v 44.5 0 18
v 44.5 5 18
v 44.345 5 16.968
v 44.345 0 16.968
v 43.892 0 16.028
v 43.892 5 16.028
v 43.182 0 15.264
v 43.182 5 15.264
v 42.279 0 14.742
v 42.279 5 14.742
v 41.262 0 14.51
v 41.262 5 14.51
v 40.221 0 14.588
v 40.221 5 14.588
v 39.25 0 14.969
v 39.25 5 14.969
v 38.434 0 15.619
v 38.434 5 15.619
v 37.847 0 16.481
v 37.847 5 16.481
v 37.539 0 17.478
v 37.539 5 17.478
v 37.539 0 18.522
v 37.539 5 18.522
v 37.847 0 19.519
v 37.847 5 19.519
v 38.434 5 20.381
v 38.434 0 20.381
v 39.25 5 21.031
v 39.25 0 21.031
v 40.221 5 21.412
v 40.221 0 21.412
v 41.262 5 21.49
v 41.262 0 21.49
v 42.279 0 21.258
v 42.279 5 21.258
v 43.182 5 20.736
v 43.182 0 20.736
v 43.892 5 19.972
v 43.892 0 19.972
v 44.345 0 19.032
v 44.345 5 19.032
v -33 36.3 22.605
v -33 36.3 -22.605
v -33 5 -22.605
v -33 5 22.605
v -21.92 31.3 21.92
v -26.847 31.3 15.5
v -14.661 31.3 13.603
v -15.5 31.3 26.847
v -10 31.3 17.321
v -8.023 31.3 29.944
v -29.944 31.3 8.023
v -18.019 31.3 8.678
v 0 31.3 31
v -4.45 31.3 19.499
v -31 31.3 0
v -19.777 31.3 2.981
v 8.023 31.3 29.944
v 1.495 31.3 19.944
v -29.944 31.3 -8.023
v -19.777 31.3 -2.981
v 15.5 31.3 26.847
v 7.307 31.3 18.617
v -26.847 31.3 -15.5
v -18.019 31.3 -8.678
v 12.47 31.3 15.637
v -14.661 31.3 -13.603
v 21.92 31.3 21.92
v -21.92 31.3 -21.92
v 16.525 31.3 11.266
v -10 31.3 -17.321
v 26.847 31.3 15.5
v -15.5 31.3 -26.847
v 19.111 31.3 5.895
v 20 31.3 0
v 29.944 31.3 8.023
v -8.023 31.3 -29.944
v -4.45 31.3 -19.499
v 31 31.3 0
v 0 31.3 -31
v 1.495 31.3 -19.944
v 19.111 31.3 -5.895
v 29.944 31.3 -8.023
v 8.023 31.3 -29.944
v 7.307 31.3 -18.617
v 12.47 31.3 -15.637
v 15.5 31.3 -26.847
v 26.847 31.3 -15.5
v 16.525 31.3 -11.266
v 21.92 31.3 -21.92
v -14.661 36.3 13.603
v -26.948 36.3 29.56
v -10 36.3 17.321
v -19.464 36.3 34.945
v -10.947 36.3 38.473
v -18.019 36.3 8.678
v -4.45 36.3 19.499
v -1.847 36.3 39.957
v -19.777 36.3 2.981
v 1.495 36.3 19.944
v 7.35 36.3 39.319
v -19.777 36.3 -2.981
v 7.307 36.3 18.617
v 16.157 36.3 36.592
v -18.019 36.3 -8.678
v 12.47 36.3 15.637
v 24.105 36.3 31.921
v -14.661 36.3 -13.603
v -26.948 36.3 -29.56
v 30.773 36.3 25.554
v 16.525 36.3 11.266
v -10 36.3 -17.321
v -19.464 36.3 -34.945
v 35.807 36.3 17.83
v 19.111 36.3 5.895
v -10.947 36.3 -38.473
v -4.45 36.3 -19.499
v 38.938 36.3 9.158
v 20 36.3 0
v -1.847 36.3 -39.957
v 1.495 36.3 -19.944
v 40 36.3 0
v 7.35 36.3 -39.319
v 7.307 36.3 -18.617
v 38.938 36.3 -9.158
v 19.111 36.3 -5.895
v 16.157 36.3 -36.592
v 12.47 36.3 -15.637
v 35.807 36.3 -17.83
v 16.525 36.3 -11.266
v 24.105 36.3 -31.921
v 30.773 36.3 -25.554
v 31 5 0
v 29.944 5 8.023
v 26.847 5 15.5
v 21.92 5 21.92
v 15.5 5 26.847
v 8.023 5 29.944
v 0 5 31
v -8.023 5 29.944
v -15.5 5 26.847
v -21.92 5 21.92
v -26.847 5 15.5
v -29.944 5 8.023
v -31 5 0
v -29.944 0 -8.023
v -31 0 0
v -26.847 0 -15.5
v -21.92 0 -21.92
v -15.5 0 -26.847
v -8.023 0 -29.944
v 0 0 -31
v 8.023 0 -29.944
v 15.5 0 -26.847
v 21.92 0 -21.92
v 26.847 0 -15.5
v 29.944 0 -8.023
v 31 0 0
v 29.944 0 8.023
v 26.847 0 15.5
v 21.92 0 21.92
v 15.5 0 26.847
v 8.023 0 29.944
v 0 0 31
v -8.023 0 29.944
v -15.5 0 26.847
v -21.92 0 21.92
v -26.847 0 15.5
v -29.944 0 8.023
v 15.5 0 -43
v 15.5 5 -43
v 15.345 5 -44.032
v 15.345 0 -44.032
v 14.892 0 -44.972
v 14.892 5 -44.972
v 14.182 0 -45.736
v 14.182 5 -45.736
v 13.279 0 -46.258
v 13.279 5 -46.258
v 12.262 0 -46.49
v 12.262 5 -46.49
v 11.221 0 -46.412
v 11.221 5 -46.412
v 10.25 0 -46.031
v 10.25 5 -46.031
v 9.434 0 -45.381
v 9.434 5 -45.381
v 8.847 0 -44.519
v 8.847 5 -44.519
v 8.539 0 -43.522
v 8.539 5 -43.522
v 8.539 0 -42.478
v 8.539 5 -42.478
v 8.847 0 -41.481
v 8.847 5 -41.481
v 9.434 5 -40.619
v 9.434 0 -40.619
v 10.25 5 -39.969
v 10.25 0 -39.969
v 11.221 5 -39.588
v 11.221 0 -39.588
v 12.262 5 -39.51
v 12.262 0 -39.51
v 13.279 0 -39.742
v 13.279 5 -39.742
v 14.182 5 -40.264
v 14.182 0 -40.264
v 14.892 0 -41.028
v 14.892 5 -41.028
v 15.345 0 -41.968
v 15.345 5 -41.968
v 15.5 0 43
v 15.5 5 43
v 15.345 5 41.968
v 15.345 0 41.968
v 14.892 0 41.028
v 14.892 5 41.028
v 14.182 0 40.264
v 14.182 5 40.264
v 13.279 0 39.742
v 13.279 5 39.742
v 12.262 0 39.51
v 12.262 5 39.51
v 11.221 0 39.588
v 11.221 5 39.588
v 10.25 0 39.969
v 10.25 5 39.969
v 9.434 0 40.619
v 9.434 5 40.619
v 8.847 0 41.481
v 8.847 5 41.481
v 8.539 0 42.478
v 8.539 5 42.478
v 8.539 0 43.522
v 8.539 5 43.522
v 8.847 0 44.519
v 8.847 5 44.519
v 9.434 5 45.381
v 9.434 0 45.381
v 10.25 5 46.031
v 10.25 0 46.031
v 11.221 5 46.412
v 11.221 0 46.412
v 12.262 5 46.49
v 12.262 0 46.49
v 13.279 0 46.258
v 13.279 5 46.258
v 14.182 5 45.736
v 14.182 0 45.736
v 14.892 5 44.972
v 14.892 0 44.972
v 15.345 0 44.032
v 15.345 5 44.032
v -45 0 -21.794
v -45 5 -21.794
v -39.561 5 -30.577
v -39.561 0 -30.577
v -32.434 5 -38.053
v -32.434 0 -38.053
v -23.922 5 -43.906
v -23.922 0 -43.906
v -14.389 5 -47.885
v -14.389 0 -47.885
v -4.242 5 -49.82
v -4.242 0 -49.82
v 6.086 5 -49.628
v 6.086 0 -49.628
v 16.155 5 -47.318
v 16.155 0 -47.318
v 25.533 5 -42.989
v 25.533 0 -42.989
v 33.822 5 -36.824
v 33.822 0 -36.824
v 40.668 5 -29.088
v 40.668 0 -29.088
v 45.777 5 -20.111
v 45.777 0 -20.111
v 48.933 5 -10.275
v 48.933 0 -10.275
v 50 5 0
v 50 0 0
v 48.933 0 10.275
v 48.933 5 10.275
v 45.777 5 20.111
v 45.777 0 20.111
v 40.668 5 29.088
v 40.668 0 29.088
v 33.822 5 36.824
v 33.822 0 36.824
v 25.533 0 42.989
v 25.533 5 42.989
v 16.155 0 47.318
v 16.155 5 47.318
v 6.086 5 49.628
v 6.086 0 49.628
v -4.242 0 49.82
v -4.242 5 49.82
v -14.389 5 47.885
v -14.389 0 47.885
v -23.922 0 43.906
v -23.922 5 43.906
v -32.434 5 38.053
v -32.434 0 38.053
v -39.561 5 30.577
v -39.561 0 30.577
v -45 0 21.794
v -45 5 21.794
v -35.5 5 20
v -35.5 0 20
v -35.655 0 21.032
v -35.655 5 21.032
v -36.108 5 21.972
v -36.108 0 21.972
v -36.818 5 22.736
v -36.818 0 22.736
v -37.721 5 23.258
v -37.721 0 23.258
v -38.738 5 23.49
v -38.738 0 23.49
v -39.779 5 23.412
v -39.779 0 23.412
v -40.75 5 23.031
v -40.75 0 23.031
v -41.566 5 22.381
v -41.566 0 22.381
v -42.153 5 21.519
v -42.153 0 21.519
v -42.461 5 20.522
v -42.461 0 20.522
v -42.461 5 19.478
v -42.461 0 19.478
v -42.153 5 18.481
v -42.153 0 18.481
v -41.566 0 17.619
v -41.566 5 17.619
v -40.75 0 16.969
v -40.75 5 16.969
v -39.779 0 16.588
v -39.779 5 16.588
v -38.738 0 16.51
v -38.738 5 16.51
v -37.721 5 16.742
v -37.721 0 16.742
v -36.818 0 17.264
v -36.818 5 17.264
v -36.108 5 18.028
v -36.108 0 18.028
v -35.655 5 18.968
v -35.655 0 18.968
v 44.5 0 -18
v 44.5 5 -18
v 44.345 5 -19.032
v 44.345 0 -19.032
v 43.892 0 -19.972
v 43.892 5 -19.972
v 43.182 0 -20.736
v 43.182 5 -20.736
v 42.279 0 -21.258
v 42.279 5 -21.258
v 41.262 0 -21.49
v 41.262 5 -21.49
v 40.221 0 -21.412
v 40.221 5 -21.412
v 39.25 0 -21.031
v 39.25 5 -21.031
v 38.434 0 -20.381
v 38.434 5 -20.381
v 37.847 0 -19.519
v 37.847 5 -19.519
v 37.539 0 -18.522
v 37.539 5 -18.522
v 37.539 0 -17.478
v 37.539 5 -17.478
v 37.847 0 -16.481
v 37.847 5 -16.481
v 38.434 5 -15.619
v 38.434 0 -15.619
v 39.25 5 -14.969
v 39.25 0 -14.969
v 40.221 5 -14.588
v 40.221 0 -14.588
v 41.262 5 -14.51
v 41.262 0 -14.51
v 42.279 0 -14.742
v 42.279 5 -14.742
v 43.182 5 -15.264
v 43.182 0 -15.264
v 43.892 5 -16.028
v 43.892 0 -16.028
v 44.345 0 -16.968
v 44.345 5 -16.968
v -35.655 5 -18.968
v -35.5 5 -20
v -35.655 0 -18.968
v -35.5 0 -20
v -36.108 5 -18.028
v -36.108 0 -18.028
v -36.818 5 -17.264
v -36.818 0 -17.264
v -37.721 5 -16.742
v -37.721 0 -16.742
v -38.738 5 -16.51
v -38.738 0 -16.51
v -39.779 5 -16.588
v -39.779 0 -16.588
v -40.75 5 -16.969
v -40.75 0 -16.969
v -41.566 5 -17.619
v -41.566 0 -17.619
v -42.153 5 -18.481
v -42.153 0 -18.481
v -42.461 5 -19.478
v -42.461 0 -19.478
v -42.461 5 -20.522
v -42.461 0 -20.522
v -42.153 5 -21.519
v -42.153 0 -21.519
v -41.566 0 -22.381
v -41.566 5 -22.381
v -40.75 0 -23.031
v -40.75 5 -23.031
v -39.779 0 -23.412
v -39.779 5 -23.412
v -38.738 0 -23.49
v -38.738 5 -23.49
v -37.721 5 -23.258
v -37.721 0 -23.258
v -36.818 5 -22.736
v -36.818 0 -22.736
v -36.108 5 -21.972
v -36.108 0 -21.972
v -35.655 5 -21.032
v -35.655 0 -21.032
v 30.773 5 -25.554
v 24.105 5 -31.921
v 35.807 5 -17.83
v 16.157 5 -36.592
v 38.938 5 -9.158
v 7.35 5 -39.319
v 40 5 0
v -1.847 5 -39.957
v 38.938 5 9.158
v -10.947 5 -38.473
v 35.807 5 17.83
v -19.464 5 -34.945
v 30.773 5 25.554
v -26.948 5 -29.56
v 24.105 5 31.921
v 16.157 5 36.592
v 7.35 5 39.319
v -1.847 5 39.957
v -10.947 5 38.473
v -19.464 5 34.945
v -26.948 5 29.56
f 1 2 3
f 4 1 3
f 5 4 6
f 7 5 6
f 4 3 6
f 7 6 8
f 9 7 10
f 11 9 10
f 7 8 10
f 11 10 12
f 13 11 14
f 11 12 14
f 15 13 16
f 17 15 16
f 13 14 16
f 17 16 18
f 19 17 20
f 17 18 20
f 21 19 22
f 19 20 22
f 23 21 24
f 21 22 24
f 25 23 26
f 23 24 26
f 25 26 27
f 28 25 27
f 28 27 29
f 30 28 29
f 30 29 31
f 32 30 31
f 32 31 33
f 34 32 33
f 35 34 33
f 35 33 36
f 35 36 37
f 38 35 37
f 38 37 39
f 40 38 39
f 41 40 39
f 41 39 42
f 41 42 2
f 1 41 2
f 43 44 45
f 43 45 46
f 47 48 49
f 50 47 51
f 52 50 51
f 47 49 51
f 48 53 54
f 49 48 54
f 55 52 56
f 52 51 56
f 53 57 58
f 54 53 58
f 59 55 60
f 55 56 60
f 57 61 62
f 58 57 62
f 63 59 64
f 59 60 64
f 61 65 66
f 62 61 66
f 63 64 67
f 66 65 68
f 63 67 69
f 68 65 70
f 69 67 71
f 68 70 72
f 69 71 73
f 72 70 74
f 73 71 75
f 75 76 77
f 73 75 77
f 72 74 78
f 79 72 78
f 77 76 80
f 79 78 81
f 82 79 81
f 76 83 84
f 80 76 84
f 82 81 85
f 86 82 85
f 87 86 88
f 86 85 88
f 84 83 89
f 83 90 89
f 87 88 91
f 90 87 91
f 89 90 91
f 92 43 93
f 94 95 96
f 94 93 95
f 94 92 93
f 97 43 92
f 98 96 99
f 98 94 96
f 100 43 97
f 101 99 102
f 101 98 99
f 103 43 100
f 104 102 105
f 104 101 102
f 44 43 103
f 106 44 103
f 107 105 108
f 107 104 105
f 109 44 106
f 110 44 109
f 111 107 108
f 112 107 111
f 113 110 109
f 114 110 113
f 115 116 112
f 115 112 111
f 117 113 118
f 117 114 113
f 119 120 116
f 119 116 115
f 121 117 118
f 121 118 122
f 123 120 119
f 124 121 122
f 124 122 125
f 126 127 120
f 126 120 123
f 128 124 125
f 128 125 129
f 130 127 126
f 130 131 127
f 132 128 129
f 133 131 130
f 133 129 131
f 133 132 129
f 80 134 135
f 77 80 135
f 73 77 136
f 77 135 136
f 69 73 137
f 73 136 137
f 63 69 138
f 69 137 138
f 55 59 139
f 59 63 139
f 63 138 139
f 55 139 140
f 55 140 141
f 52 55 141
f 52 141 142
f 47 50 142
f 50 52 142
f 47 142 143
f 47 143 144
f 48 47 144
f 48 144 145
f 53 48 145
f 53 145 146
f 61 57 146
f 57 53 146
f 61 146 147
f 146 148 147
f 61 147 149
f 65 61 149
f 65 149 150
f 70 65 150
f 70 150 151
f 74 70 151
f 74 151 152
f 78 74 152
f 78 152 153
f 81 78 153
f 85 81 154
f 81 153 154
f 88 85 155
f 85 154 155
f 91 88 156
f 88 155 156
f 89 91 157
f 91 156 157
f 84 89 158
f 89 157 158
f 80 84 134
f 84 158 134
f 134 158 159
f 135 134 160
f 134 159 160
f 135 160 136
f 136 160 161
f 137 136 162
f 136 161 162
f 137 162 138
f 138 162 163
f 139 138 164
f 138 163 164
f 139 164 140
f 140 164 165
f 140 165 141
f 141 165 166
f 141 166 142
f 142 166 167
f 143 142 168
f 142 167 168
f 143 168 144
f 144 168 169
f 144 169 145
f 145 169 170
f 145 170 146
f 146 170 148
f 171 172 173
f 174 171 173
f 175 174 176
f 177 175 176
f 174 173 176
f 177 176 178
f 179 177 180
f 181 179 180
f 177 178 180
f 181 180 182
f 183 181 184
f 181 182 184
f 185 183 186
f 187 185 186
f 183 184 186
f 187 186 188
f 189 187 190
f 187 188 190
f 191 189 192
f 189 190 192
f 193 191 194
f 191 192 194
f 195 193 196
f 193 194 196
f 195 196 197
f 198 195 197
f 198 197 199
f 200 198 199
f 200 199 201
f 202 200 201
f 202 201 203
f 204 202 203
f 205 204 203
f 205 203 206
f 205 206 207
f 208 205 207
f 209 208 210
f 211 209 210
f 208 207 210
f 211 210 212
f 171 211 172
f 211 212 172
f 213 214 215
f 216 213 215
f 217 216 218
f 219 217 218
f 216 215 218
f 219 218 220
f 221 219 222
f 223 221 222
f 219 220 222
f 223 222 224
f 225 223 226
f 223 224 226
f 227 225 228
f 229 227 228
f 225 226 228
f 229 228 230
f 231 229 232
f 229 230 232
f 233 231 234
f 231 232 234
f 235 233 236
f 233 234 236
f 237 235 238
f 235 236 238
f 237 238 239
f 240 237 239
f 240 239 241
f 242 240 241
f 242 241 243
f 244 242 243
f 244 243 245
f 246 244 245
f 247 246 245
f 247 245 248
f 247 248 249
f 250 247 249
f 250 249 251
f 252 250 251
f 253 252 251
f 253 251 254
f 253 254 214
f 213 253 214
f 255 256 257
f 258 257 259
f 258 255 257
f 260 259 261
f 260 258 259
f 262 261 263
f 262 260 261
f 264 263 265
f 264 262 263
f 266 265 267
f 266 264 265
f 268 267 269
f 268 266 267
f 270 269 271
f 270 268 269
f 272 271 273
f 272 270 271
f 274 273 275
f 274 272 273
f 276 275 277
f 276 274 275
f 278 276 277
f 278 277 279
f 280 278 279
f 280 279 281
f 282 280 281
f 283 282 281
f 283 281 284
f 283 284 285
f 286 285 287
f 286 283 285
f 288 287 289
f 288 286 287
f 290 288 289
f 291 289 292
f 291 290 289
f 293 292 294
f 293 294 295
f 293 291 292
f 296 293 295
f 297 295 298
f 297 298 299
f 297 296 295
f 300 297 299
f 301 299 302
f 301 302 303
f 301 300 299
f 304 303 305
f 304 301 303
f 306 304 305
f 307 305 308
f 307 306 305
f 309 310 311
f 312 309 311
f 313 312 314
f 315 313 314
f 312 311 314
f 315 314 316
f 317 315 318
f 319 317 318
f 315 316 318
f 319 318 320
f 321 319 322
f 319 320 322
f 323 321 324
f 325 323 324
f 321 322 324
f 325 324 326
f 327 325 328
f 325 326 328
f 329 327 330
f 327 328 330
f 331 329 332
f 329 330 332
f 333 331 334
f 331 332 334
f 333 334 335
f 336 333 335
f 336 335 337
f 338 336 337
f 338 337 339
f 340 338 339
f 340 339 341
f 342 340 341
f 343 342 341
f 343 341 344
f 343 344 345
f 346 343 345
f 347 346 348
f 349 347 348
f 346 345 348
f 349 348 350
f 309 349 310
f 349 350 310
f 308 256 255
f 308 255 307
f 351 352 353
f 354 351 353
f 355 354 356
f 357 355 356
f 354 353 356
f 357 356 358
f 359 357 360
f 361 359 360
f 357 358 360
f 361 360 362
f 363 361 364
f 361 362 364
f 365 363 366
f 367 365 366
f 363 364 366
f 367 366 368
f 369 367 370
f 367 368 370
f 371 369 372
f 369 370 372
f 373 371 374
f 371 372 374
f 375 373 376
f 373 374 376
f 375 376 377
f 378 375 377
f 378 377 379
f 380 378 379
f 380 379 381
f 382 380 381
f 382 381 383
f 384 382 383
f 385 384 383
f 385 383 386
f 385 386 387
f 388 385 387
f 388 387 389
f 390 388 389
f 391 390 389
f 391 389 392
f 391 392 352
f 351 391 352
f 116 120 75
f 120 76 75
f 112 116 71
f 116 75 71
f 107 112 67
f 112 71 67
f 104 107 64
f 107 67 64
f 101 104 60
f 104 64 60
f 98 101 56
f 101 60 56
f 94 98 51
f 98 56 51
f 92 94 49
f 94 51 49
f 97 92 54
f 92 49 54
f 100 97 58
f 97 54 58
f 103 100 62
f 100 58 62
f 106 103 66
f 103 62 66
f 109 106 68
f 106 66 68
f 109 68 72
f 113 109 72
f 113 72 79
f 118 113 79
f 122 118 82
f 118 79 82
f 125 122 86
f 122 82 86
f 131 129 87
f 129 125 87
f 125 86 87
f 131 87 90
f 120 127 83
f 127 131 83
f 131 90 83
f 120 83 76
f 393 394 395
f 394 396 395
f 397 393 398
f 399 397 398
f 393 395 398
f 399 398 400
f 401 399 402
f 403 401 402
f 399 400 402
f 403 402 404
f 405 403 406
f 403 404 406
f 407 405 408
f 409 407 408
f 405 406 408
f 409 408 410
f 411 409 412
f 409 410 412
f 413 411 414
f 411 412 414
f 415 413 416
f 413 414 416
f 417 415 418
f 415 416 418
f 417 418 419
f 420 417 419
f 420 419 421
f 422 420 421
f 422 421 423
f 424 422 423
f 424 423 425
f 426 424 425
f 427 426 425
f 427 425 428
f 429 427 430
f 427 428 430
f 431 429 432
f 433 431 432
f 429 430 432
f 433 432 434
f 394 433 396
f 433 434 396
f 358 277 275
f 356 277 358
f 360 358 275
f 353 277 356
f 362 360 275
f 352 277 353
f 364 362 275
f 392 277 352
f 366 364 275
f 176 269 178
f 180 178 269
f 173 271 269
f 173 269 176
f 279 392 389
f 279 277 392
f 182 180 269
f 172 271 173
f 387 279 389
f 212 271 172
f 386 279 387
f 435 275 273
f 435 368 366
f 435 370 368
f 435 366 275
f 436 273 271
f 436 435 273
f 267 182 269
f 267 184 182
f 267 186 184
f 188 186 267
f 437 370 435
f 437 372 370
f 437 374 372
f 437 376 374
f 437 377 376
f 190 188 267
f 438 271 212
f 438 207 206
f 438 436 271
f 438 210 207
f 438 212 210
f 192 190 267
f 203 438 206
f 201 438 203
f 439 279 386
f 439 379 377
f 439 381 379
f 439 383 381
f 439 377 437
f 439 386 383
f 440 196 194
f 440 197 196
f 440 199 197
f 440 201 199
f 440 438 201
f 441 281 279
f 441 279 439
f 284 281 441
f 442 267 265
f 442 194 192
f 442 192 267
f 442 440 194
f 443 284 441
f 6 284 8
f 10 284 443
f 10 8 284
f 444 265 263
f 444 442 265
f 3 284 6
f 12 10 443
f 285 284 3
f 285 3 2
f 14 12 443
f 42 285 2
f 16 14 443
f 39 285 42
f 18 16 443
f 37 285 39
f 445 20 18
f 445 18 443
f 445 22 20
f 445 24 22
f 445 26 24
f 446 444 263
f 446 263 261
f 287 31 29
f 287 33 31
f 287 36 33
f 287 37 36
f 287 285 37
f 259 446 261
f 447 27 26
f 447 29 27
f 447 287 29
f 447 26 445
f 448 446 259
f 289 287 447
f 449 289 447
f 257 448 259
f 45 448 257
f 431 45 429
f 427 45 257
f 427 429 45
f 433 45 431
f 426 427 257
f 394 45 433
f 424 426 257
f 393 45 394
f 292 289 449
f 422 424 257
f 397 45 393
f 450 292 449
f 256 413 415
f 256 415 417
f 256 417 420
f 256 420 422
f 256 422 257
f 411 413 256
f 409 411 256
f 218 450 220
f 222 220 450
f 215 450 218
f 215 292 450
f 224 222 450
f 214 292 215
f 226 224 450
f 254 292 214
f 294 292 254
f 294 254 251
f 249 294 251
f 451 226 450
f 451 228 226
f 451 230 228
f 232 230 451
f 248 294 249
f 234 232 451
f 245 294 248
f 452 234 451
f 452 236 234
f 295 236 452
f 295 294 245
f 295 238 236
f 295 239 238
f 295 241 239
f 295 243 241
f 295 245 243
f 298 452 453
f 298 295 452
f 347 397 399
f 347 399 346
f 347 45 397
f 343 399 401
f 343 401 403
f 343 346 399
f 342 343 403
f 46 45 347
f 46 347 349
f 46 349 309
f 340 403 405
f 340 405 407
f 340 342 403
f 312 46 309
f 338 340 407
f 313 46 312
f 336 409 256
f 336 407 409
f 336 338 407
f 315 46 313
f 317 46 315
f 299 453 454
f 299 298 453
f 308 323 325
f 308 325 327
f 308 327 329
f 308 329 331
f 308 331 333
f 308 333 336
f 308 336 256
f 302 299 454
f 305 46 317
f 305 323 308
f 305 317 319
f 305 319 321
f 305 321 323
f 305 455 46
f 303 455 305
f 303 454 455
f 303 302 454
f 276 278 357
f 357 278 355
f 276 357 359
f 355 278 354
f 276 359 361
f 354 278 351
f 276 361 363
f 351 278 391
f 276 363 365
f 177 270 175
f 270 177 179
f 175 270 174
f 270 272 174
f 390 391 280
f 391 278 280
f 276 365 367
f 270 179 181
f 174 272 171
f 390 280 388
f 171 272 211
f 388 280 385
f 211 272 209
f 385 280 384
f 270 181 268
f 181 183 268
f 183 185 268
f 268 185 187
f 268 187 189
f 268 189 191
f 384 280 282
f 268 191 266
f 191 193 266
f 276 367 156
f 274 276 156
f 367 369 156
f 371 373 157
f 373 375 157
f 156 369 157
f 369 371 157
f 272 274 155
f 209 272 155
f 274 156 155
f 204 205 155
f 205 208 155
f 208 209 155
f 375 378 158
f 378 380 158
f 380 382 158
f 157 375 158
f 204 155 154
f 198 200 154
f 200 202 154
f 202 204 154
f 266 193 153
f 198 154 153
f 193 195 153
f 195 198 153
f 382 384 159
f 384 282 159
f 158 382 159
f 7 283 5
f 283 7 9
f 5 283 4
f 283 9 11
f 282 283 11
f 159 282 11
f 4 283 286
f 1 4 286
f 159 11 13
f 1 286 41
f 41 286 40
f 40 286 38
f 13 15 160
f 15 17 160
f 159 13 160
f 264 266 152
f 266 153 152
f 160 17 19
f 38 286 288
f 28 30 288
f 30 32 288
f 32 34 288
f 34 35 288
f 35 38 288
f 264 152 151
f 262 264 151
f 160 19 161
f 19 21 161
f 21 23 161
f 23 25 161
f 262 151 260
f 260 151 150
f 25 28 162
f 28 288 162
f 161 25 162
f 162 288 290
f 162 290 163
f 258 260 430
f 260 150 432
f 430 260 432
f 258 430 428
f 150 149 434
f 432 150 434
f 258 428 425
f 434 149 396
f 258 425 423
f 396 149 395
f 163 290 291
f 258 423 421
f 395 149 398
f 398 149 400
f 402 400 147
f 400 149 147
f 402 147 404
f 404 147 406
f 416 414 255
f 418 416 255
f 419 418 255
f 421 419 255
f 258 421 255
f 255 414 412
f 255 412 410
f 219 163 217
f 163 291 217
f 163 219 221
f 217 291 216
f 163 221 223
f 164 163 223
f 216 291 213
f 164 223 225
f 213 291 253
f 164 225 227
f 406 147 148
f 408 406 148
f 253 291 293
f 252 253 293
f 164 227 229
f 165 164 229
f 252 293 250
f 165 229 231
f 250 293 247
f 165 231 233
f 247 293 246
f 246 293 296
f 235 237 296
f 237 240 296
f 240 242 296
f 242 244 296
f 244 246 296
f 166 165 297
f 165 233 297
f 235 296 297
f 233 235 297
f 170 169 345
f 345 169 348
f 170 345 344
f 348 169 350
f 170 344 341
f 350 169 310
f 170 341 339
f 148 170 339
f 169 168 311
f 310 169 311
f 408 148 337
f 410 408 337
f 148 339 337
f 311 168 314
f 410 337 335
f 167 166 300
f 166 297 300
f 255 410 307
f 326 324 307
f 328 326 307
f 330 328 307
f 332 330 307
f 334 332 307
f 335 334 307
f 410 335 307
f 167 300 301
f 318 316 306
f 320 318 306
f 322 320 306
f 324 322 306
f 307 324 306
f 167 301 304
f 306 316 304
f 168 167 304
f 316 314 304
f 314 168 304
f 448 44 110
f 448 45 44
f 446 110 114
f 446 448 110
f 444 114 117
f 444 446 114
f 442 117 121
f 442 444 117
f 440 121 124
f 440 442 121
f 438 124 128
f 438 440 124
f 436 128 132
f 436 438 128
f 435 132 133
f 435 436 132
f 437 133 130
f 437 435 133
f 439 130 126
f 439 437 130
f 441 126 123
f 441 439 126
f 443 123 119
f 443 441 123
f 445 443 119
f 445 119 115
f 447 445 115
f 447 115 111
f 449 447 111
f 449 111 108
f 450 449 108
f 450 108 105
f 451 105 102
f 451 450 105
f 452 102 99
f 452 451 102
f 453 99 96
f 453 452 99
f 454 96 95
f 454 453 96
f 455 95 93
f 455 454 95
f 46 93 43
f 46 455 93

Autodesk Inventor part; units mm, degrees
ref_plane "YZ Plane" through (0, 0, 0) normal (1, 0, 0) x (0, 1, 0)
ref_plane "XZ Plane" through (0, 0, 0) normal (0, 1, 0) x (-1, 0, 0)
ref_plane "XY Plane" through (0, 0, 0) normal (0, 0, 1) x (1, 0, 0)
sketch "Esquisse1" plane through (0, 0, 0) normal (0, 1, 0) x (-1, 0, 0)
  circle A0 centre (0, 0) radius 31
  circle A1 centre (0, 0) radius 50
  circle A2 centre (0, 0) radius 40
  line L0 (45, -21.7945) -> (45, 21.7945)
  dimension "d0" = 62
  dimension "d1" = 100
  dimension "d2" = 80
  dimension "d47" = 45
extrude "Extrusion1" add sketch "Esquisse1" along normal blind 5 contours A1 L0 | L0 A1 | A2
sketch "Esquisse2" plane through (0, 5, 0) normal (0, 1, 0) x (1, 0, 0)
  circle A0 centre (0, 0) radius 40
  circle A1 centre (0, 0) radius 31 projected
  circle A2 centre (0, 0) radius 31
  dimension "d6" = 80
  dimension "d75" = 0
extrude "Extrusion2" add sketch "Esquisse2" along normal blind 26.3
sketch "Esquisse3" plane through (0, 31.3, 0) normal (0, 1, 0) x (1, 0, 0)
  circle A0 centre (0, 0) radius 20
  circle A1 centre (0, 0) radius 40
  circle A2 centre (0, 0) radius 40 projected
  dimension "d9" = 40
  dimension "d63" = 0
extrude "Extrusion3" add sketch "Esquisse3" along normal blind 5
sketch "Esquisse5" plane through (0, 36.3, 0) normal (0, 1, 0) x (1, 0, 0)
  line L0 (-33, 22.6053) -> (-33, -22.6053)
  circle A0 centre (0, 0) radius 40
  circle A1 centre (0, 0) radius 40 projected
  point P0 (-33, 22.6053)
  dimension "d71" = 80
  dimension "d72" = 33
extrude "Extrusion4" cut sketch "Esquisse5" against normal up to surface (31.3 mm away) contours L0 A0 picked at (-34.2788, -5.1971)
sketch "Esquisse6" plane through (0, 5, 0) normal (0, 1, 0) x (1, 0, 0)
  point P0 (0, 0)
sketch "Esquisse7" plane through (0, 5, 0) normal (0, 1, 0) x (1, 0, 0)
  line L0 (12, 65.0926) -> (12, -68.5298) construction
  circle A0 centre (0, 0) radius 20 construction
  circle A1 centre (12, 43) radius 3.5
  circle A2 centre (12, -43) radius 3.5
  point P0 (-37.5, -12.5)
  point P1 (-37.5, 12.5)
  dimension "d53" = 12
  dimension "d54" = 7
  dimension "d55" = 7
  dimension "d56" = 43
  dimension "d57" = 43
extrude "Extrusion6" cut sketch "Esquisse7" against normal blind 10
sketch "Esquisse8" plane through (0, 5, 0) normal (0, 1, 0) x (1, 0, 0)
  line L0 (-45, 21.7945) -> (-45, -21.7945)
  circle A0 centre (0, 0) radius 50
  dimension "d73" = 45
  dimension "d74" = 100
extrude "Extrusion7" cut sketch "Esquisse8" against normal blind 5 contours L0 A0 picked at (-46.0601, 4.4554)
sketch "Esquisse9" plane through (0, 5, 0) normal (0, 1, 0) x (1, 0, 0)
  line L0 (41, 168.1574) -> (41, -90.4051) construction
  circle A0 centre (41, 18) radius 3.5
  circle A1 centre (41, -18) radius 3.5
  circle A2 centre (0, 0) radius 20 projected
  dimension "d58" = 7
  dimension "d59" = 7
  dimension "d60" = 18
  dimension "d61" = 18
  dimension "d62" = 41
extrude "Extrusion8" cut sketch "Esquisse9" against normal blind 5 contours A0 | A1
sketch "Sketch10" plane through (0, 0, 0) normal (0, -1, 0) x (1, 0, 0)
  line L0 (-39, -54.8136) -> (-39, 70.7566) construction
  circle A0 centre (-39, -20) radius 3.5
  circle A1 centre (-39, 20) radius 3.5
  point P0 (0, 0)
  dimension "d64" = 39
  dimension "d65" = 20
  dimension "d66" = 20
  dimension "d67" = 7
  dimension "d68" = 7
extrude "Extrusion9" cut sketch "Sketch10" against normal blind 5
equation "\"d55\" = d54"
equation "\"d57\" = d56"
equation "\"d59\" = d58"
equation "\"d61\" = d60"
equation "\"d68\" = d67"
properties part number "B1 fixe2"
